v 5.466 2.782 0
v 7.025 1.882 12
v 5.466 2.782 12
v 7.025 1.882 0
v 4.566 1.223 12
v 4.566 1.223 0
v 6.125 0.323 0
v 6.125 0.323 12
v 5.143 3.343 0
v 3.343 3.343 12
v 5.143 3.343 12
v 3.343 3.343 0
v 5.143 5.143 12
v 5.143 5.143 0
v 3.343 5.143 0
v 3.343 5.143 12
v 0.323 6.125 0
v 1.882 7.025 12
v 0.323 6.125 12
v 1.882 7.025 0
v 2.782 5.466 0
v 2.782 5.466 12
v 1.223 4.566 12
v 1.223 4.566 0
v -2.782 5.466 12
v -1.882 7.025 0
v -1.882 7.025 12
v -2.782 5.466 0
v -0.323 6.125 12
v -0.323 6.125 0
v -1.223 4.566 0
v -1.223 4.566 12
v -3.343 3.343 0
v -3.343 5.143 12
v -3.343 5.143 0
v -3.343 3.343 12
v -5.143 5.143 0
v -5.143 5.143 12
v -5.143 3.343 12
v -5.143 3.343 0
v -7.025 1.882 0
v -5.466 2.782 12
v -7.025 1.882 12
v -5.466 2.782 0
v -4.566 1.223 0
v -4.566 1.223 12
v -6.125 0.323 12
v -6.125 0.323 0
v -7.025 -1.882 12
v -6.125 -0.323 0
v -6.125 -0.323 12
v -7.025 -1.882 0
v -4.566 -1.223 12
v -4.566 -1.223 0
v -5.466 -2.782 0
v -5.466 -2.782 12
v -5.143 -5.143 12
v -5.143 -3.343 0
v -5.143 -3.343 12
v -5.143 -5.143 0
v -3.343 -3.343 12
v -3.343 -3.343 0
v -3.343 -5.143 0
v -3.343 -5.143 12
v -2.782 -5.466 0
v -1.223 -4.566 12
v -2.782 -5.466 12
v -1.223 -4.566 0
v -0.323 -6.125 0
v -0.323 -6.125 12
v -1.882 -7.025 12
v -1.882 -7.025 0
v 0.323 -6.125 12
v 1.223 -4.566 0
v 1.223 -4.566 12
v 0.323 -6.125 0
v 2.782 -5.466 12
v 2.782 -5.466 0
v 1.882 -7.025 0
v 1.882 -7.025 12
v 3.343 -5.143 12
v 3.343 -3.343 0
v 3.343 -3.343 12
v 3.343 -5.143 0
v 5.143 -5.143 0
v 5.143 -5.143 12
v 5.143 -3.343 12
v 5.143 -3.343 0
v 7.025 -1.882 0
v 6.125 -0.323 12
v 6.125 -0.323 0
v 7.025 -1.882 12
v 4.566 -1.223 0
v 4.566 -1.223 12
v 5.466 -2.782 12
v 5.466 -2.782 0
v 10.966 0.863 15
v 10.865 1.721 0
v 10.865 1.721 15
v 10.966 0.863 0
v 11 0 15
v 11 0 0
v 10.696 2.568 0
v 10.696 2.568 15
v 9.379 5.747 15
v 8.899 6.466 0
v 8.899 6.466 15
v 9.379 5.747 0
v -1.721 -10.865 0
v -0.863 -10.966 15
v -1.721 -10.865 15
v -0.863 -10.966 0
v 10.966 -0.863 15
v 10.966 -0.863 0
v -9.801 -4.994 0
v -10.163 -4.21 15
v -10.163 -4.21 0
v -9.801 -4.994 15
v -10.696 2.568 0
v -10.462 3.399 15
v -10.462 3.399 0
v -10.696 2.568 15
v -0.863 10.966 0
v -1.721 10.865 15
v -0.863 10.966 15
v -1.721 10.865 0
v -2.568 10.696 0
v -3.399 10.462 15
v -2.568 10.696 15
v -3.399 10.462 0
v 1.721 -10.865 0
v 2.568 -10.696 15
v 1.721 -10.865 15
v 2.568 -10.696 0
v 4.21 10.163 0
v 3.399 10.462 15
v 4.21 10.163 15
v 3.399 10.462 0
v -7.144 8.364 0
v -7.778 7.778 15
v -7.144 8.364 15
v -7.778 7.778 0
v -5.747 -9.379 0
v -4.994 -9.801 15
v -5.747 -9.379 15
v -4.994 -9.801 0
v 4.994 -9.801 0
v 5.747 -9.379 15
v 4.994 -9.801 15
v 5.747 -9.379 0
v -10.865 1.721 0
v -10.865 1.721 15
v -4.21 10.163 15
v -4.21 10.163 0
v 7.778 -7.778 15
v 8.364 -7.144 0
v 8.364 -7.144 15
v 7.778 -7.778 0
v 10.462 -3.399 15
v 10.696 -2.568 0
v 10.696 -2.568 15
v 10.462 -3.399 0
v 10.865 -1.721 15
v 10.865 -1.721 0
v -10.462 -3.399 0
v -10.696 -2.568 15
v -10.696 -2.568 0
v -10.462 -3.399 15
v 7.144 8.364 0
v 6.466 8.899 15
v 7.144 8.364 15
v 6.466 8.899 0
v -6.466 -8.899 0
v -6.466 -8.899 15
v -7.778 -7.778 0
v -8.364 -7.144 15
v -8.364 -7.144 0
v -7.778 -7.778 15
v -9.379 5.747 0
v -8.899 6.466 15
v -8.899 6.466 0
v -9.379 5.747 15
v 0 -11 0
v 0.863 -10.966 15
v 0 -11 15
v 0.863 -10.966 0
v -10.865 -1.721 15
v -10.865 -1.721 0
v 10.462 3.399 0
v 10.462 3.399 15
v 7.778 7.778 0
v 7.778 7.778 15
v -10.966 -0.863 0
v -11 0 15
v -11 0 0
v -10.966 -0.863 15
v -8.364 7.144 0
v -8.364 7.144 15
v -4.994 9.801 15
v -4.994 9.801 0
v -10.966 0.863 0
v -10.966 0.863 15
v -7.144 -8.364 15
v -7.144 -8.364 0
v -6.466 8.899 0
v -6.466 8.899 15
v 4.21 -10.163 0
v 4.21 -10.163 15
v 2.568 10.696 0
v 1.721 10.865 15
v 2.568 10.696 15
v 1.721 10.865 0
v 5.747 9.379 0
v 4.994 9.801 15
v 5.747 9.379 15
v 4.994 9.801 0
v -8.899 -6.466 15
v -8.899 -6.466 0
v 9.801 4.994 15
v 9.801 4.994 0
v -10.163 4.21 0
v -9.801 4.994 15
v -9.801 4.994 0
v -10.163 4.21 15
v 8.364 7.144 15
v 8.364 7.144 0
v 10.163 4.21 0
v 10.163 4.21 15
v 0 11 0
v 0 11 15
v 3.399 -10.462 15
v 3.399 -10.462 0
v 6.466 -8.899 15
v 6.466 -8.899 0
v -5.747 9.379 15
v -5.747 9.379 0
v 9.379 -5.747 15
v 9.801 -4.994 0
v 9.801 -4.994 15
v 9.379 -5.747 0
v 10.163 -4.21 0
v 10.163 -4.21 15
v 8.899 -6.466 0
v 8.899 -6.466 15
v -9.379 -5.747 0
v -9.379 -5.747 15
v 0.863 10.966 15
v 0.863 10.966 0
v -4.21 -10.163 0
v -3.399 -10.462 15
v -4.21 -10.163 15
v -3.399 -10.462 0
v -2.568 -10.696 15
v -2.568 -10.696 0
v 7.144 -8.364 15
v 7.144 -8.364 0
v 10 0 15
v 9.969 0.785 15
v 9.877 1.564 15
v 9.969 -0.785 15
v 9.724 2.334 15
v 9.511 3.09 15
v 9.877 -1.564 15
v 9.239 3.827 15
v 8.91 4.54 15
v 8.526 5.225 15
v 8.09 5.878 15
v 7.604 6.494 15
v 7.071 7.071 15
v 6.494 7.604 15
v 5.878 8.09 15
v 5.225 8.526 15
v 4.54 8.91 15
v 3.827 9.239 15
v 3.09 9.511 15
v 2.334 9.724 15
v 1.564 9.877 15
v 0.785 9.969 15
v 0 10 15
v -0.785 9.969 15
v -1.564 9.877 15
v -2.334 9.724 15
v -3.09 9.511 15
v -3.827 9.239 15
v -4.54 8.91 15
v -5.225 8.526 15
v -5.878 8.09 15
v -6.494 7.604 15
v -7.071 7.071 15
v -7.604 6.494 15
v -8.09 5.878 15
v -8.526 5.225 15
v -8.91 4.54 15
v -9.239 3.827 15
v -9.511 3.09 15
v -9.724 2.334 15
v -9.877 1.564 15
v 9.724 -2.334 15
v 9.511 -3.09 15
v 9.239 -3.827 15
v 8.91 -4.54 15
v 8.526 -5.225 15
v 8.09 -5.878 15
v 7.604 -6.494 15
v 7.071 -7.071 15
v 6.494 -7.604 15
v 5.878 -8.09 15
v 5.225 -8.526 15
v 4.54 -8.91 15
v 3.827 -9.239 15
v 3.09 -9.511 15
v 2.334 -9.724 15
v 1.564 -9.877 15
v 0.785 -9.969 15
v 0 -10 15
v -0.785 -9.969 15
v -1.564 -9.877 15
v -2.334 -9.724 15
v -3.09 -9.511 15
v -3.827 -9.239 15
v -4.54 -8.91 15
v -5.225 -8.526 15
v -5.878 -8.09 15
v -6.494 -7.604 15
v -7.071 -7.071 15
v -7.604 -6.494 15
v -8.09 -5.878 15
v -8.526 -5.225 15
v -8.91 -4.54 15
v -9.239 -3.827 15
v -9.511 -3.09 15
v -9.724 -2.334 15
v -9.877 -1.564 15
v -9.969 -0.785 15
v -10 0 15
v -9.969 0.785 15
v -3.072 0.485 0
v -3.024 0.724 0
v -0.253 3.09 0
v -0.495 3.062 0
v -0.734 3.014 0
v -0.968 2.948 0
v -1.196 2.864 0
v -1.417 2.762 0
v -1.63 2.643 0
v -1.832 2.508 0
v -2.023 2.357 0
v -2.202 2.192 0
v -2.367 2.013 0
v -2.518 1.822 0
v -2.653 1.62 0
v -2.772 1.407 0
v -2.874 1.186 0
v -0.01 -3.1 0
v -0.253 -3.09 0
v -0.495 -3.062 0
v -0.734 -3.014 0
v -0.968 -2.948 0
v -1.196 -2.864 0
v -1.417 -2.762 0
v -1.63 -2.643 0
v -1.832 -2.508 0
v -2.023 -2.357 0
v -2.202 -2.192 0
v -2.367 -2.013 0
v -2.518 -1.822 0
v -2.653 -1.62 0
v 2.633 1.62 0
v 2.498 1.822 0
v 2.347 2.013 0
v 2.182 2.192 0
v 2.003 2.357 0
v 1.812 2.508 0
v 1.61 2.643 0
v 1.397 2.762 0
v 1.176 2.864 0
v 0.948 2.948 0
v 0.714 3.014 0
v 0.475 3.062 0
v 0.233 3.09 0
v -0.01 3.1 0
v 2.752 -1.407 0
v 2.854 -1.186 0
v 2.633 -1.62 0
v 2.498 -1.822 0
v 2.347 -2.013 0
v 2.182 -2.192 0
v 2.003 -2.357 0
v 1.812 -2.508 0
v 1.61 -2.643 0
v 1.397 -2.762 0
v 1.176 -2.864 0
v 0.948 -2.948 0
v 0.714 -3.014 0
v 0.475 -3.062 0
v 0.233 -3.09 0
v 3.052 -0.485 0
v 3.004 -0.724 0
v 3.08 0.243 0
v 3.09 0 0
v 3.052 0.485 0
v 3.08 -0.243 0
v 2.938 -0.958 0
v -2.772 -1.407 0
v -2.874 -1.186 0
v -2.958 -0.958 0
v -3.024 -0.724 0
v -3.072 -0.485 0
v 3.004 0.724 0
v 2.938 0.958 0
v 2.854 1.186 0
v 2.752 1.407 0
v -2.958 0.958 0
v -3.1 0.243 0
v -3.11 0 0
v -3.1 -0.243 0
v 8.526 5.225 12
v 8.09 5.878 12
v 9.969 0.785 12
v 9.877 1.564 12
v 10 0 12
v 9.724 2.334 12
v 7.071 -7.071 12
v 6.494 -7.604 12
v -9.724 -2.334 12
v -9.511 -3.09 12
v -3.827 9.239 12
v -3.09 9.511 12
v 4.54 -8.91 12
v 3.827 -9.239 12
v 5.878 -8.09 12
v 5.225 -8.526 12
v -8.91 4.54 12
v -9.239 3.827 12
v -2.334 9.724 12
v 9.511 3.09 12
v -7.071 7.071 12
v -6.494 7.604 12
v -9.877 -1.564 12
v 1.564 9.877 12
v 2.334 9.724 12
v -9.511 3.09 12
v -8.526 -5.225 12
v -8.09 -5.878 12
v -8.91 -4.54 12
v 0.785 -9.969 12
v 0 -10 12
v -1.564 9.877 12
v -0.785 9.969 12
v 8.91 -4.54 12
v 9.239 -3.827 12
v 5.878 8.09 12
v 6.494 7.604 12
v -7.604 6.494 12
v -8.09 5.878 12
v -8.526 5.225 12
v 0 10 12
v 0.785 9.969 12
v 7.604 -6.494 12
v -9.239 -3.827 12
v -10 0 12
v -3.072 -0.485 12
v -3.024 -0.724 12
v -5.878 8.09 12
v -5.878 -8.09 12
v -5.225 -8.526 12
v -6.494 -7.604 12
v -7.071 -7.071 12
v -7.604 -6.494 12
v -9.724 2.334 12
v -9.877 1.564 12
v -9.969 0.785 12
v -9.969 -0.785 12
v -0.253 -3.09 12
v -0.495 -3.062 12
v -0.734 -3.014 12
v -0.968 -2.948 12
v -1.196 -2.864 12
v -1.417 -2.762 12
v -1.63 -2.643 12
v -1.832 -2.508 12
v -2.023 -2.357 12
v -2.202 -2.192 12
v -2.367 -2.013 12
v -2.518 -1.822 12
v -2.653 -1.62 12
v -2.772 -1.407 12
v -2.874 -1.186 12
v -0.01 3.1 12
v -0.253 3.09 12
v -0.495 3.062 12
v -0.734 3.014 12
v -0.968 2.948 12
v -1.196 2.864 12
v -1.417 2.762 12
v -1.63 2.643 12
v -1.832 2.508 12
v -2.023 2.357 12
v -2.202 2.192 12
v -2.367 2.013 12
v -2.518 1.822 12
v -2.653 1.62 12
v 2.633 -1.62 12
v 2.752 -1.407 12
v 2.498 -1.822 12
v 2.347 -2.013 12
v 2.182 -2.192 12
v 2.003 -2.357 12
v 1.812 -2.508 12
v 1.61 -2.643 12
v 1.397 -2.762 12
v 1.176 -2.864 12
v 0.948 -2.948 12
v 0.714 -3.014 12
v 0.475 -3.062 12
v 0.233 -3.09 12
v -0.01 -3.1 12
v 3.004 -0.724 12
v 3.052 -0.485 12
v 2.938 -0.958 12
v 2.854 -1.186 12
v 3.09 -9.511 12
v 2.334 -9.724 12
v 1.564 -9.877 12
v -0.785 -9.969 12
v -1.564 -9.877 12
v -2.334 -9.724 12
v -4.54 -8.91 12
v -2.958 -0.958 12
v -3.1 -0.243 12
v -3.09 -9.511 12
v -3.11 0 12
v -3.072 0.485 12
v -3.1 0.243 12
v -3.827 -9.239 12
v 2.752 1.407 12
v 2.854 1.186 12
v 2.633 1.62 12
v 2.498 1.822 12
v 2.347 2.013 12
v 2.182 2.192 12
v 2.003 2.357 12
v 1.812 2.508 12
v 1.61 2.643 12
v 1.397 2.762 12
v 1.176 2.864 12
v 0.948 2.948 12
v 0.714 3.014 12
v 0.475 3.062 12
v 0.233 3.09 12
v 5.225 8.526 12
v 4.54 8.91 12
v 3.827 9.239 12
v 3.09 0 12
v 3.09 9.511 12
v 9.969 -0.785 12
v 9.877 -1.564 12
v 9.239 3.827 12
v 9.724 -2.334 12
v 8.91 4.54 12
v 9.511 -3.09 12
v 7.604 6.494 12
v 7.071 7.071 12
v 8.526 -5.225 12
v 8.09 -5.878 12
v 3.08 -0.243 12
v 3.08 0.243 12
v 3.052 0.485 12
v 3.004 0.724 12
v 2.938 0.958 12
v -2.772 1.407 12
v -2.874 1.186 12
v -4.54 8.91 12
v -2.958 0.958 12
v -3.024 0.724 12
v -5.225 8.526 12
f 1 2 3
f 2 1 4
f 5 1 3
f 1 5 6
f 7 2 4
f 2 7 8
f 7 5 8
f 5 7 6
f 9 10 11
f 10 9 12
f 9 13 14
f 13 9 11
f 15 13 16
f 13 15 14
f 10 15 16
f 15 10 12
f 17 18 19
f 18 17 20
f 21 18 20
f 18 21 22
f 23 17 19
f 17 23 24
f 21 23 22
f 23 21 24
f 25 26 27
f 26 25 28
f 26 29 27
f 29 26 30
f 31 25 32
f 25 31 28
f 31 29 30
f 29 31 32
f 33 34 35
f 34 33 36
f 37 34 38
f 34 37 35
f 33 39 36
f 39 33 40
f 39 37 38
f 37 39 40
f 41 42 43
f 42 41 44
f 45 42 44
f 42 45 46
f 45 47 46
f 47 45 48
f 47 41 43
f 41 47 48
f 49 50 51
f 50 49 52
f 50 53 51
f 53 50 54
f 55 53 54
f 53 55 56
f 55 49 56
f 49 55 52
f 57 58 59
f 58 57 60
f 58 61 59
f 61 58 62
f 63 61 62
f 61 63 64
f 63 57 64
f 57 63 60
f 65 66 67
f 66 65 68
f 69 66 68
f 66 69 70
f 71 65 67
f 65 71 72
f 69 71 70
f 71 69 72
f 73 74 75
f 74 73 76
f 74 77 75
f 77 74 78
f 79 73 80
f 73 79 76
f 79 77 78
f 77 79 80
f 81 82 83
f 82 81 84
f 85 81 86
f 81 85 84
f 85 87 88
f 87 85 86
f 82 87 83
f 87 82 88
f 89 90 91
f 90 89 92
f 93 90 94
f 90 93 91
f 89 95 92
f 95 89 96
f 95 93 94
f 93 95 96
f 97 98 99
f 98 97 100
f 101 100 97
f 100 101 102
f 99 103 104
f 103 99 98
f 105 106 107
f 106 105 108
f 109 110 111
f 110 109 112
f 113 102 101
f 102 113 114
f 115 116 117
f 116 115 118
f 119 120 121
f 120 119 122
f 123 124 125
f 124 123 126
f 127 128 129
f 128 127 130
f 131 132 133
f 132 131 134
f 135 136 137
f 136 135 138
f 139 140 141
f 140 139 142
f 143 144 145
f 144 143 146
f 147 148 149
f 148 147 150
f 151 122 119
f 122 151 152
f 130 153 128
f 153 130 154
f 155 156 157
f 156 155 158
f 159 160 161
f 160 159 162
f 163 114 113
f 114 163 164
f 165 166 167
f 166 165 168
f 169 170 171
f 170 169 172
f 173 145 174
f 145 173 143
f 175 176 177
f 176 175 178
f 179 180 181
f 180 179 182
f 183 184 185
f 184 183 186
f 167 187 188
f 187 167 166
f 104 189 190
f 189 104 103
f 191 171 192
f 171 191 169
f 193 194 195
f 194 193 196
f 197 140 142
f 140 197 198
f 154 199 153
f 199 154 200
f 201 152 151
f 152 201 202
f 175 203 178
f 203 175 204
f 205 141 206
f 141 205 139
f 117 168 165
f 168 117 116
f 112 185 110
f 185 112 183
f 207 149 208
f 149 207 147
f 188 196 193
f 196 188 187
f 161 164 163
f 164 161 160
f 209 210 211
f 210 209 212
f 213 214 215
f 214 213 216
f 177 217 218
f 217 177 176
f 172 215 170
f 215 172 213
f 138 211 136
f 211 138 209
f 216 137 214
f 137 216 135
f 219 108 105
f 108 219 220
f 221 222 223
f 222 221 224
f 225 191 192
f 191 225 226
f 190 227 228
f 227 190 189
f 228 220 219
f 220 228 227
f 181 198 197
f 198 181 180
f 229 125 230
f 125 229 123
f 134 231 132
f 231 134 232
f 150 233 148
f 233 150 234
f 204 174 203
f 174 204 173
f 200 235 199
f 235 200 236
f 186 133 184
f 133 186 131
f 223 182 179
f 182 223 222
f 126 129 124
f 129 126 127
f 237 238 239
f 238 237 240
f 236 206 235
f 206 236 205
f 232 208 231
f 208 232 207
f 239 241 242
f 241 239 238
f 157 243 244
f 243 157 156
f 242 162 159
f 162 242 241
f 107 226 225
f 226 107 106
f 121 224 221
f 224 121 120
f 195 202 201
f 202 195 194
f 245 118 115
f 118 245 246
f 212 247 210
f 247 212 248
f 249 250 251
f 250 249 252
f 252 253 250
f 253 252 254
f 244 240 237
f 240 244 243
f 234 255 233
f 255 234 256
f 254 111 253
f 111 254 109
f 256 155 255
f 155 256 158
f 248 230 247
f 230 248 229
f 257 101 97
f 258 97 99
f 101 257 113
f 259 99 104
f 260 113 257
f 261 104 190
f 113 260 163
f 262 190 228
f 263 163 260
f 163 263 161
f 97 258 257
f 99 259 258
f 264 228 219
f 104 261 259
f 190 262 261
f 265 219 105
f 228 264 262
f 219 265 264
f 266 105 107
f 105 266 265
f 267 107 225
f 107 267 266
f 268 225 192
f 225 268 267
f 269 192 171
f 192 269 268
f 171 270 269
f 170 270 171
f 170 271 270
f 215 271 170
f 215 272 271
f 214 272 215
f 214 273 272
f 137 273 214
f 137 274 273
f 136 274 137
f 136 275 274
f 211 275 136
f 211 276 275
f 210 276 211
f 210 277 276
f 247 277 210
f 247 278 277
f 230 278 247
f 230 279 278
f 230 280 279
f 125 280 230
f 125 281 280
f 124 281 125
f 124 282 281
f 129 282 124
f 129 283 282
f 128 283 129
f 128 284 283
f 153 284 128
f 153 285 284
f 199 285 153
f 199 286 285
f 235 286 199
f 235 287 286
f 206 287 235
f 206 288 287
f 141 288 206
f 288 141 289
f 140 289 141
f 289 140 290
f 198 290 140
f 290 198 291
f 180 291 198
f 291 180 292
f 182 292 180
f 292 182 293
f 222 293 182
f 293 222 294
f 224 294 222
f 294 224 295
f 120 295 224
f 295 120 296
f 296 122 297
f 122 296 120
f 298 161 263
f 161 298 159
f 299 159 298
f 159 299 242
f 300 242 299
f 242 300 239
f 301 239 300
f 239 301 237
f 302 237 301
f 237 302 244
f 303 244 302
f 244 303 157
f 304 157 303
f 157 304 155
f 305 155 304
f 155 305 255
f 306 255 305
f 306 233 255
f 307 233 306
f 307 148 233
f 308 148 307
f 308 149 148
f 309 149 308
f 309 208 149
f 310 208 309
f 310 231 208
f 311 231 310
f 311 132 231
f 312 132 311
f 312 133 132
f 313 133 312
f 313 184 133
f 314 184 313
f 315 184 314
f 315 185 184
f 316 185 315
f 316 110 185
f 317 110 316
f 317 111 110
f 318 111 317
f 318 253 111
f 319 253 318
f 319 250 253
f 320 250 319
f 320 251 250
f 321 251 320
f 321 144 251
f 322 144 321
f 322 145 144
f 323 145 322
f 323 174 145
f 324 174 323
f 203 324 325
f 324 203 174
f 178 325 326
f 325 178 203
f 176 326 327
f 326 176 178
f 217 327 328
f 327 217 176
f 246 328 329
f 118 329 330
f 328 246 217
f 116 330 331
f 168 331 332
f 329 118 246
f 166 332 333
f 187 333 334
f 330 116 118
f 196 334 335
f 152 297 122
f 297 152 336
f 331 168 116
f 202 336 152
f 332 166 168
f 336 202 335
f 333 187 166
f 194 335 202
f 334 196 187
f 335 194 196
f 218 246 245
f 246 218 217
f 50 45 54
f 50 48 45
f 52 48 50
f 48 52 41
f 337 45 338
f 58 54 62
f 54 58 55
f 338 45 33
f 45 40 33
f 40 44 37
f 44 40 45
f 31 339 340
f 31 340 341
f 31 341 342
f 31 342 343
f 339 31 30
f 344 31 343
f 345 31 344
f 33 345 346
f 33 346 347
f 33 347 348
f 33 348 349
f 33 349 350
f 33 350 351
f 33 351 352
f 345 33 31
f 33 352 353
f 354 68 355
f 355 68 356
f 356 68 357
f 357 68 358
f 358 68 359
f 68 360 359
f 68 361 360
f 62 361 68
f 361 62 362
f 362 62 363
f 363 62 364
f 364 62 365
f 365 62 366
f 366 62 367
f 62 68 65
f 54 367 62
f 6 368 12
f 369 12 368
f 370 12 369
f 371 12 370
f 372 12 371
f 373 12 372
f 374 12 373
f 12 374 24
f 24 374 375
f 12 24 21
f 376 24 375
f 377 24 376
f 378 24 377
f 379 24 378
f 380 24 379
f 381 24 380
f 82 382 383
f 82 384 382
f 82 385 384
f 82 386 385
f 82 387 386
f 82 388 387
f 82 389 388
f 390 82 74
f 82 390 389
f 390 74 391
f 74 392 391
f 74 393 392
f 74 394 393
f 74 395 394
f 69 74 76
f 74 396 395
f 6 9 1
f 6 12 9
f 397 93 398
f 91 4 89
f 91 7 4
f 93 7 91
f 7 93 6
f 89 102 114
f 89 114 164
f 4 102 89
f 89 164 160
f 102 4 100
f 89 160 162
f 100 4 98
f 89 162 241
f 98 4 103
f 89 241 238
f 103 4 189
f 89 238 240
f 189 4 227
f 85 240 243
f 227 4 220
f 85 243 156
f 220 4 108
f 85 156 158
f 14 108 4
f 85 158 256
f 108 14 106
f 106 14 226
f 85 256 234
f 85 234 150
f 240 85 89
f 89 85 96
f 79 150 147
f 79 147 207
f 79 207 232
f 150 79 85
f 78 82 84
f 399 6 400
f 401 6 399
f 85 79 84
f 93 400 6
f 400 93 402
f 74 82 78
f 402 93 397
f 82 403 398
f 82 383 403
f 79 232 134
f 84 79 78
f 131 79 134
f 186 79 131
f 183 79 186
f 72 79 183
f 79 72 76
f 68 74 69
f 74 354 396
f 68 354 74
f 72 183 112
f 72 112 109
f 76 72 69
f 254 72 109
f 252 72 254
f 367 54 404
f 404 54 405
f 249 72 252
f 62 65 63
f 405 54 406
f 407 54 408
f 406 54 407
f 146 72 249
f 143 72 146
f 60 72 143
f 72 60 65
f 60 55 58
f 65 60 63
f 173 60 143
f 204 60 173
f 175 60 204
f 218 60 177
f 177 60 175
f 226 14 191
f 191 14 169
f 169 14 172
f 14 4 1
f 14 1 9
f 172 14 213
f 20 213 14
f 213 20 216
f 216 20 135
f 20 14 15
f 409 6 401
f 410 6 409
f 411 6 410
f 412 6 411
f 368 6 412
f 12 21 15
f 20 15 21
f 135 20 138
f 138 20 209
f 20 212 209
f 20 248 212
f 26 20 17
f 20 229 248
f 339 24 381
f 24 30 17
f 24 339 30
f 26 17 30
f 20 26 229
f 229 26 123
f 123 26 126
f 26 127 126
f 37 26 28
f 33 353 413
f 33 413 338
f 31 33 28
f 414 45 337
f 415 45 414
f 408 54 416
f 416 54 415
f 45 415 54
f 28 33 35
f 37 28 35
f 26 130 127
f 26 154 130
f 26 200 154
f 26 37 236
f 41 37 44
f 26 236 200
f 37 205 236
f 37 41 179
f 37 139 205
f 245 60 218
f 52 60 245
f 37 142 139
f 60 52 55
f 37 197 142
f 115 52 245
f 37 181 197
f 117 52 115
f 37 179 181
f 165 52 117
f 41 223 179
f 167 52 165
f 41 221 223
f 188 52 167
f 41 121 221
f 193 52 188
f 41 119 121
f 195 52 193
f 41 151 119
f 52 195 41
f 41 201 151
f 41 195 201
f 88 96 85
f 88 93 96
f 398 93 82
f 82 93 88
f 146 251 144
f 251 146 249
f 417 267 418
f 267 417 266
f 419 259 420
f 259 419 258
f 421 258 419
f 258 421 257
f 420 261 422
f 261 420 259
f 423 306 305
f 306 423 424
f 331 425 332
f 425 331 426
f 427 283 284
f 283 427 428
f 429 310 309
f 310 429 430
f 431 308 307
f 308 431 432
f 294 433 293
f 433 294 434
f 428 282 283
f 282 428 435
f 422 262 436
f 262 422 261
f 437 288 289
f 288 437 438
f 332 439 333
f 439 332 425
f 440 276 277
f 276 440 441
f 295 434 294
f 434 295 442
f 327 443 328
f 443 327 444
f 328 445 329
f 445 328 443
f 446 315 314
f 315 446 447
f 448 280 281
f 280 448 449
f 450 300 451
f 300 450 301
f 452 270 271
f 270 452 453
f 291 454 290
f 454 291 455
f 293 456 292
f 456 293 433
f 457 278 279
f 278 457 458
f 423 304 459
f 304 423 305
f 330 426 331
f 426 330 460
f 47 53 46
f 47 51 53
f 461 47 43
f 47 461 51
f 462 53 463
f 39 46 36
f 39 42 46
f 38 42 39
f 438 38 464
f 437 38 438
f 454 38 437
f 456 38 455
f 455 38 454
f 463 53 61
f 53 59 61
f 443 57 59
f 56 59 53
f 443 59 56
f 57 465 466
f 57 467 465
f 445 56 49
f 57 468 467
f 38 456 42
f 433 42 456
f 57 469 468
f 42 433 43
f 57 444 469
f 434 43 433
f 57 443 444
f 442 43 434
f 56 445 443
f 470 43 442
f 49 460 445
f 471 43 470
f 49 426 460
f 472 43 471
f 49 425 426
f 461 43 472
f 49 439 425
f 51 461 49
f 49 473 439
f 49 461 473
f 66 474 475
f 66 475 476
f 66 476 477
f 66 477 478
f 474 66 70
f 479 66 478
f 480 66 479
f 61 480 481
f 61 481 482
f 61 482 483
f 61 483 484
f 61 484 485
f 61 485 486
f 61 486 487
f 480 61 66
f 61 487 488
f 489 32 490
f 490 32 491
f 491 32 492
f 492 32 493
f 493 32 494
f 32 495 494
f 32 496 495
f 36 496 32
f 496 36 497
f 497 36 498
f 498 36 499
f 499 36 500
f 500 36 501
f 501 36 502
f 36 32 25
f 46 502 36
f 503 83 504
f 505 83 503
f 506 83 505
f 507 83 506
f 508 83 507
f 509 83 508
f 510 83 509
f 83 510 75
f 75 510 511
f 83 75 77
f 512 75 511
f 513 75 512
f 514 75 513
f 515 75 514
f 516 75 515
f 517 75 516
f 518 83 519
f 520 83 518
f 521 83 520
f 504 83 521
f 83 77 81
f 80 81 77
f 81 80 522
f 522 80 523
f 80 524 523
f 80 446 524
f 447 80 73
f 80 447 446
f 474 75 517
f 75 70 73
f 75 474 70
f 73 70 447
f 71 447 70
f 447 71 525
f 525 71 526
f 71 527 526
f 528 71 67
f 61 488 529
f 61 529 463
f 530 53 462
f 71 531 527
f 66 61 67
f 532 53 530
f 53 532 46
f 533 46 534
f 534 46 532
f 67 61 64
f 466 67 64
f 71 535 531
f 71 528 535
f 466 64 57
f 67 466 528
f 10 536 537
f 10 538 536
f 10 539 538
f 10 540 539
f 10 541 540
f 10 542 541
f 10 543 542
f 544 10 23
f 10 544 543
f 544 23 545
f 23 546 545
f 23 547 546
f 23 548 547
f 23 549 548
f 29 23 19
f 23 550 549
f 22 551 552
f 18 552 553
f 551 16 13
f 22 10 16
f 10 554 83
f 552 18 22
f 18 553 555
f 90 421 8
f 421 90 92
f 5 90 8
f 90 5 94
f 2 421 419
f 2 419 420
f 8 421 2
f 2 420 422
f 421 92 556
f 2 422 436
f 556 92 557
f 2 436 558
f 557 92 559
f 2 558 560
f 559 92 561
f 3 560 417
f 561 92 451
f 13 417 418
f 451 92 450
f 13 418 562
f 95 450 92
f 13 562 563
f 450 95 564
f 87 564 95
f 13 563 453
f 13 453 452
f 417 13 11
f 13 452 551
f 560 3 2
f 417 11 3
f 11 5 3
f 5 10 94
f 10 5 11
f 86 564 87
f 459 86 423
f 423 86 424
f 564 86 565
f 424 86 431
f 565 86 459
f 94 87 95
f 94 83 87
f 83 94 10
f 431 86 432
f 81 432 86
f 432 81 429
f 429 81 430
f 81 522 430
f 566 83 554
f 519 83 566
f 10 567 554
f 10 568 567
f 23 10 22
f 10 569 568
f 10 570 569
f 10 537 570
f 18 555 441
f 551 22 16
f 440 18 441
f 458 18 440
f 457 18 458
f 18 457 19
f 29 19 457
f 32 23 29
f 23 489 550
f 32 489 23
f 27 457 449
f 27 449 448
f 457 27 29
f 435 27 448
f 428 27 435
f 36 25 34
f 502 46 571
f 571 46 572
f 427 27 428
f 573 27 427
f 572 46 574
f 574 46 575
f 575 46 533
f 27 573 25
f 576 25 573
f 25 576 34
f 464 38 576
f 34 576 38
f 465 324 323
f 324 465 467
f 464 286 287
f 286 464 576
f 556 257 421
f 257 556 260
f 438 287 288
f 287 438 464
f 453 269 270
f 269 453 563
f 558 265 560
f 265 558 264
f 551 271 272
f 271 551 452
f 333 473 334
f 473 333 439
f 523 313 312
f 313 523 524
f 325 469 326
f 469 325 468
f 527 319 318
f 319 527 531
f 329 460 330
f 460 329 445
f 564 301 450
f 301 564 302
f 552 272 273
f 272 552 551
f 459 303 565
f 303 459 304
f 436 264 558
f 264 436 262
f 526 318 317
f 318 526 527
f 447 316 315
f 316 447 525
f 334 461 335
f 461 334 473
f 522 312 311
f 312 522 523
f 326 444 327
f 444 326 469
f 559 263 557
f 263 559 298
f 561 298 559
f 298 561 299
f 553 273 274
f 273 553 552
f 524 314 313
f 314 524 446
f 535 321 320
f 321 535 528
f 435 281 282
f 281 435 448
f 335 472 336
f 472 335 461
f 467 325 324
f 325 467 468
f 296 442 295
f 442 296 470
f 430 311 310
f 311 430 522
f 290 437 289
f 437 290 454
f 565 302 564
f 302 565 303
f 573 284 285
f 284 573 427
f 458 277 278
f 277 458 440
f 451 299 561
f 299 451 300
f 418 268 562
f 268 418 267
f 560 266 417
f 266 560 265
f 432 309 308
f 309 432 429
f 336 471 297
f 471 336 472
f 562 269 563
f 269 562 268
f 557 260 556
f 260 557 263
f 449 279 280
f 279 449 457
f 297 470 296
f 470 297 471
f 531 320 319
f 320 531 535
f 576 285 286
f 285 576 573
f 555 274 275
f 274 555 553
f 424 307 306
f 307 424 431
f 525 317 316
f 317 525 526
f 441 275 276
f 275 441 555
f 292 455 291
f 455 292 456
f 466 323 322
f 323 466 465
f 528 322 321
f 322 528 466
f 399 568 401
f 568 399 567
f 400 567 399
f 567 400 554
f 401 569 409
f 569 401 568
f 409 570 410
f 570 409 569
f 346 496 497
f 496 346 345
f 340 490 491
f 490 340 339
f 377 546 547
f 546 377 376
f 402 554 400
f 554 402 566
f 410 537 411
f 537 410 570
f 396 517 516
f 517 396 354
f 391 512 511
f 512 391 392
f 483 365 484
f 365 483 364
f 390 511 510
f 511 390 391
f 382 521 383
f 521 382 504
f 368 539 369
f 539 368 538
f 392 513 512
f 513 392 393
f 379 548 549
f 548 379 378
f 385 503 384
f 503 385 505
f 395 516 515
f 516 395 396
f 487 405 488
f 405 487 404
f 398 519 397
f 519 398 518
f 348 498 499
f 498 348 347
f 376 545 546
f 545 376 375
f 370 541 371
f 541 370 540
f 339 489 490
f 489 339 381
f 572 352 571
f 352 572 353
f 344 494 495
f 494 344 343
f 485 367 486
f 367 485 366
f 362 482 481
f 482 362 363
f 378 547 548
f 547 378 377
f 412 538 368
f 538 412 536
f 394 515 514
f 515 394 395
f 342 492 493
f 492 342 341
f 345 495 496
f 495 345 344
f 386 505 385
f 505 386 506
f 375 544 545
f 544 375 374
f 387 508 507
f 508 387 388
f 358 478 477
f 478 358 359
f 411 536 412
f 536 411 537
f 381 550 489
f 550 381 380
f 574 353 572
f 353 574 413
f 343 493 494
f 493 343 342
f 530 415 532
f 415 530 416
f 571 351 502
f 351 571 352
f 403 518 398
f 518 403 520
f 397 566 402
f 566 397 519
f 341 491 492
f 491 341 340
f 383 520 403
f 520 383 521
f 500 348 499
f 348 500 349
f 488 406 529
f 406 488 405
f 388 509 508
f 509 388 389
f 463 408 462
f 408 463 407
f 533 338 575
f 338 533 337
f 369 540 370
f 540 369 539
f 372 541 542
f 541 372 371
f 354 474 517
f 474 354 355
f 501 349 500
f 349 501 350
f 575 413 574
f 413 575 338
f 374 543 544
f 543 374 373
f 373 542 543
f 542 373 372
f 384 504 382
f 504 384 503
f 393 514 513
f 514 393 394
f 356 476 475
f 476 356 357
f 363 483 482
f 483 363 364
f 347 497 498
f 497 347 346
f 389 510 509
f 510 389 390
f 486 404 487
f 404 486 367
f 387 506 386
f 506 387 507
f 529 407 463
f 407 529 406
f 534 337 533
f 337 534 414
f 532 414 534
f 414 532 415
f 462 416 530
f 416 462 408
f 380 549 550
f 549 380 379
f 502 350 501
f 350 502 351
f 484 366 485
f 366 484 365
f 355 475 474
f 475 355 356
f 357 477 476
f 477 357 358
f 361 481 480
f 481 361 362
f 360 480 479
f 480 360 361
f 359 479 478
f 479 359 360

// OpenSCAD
//Uses Nophead's polyhole.
module polyhole(h, d) {
    n = max(round(2 * d),3);
    rotate([0,0,180])
        cylinder(h = h, r = (d / 2) / cos (180 / n), $fn = n);
}

$fn=80;
total_height = 15;
neopixel_width = 6.25;
tube_dia = 20;
wall_thickness = 1;
base_thickness = 12;
num_pins = 12;
pin_diameter = 12;
pin_hole_dia = 1.8;

difference() {
  cylinder(r=(tube_dia/2) + wall_thickness, h = total_height); 
  translate([0,0,base_thickness]) cylinder(r=tube_dia/2, h = 100);  
  translate([-0.01,0,0]) cylinder(d=6.2, h=100); 
    
  //translate([-neopixel_width/2,-neopixel_width/2,-0.1]) cube([neopixel_width, neopixel_width,100]);
  for (i=[0:num_pins-1]) rotate([0,0,(360/num_pins/2) + 360/num_pins * i]) translate([pin_diameter/2,0,-0.1]) polyhole(100, pin_hole_dia);
}
